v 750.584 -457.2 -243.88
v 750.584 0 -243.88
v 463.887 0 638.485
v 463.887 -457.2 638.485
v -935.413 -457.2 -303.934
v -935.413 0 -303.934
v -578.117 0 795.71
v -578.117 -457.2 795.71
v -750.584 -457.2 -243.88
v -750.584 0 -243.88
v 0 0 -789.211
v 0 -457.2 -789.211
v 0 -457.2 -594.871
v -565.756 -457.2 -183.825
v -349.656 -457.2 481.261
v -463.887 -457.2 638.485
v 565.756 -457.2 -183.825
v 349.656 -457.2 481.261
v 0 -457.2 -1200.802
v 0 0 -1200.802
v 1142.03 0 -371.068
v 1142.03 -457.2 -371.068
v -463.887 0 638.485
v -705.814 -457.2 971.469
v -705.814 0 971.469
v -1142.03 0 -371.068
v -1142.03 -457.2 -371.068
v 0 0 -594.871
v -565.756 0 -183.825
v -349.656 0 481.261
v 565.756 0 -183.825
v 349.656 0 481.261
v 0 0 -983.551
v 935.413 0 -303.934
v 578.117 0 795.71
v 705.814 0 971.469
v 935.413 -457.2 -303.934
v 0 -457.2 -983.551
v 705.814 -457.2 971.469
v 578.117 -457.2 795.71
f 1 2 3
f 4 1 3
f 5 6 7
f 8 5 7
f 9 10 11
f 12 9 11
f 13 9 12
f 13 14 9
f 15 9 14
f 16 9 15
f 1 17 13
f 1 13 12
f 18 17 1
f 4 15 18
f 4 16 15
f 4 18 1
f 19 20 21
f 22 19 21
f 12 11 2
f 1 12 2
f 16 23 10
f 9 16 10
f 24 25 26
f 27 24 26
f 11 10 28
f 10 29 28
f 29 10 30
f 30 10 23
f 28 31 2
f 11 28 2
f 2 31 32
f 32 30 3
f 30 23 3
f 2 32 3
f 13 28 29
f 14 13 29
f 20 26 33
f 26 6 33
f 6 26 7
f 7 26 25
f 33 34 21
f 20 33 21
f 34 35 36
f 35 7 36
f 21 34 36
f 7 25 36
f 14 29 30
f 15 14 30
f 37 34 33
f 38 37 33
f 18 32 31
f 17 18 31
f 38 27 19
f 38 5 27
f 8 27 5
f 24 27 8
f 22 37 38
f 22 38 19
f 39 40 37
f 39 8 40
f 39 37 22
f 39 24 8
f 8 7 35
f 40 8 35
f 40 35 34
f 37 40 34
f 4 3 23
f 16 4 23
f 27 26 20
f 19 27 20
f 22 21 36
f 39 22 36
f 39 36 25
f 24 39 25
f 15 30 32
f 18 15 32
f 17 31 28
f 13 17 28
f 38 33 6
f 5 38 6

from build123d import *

# Parameters (mm, degrees)
F1_DEPTH = 457.2
F2_DEPTH = 457.2
F3_DEPTH = 457.2


with BuildPart() as f1:
    # F0 (on Front) → F1 (new body)
    with BuildSketch(Plane.XZ):
        Polygon((-1142.0303102433, -371.068141493), (0, -1200.8017301559), (1142.0303102433, -371.068141493), (705.813547913, 971.469006571), (-705.813547913, 971.469006571), align=None)
        Polygon((935.4130086182, -303.9341106125), (0, -983.5514426231), (-935.4130086182, -303.9341106125), (-578.1170328449, 795.7098319241), (578.1170328449, 795.7098319241), align=None, mode=Mode.SUBTRACT)
    extrude(amount=F1_DEPTH)

    # F0 (on Front) → F3 (cut)
    with BuildSketch(Plane.XZ):
        Polygon((-407.9753176564, -132.5592162834), (0, -428.9706349373), (407.9753176564, -132.5592162834), (252.1426128827, 347.0445337521), (-252.1426128827, 347.0445337521), align=None)
        Polygon((281.7509045029, -91.5464183044), (0, -296.2504327297), (-281.7509045029, -91.5464183044), (-174.1316353438, 239.6716346693), (174.1316353438, 239.6716346693), align=None, mode=Mode.SUBTRACT)
    extrude(amount=F3_DEPTH, mode=Mode.SUBTRACT)


with BuildPart() as f2:
    # F0 (on Front) → F2 (new body)
    with BuildSketch(Plane.XZ):
        Polygon((-750.5844107294, -243.8796587313), (0, -789.2111539841), (750.5844107294, -243.8796587313), (463.8866772566, 638.4852357234), (-463.8866772566, 638.4852357234), align=None)
        Polygon((565.7558128405, -183.8252068501), (0, -594.870865345), (-565.7558128405, -183.8252068501), (-349.6563216683, 481.2606395226), (349.6563216683, 481.2606395226), align=None, mode=Mode.SUBTRACT)
    extrude(amount=F2_DEPTH)


solid = Compound([f1.part, f2.part])
